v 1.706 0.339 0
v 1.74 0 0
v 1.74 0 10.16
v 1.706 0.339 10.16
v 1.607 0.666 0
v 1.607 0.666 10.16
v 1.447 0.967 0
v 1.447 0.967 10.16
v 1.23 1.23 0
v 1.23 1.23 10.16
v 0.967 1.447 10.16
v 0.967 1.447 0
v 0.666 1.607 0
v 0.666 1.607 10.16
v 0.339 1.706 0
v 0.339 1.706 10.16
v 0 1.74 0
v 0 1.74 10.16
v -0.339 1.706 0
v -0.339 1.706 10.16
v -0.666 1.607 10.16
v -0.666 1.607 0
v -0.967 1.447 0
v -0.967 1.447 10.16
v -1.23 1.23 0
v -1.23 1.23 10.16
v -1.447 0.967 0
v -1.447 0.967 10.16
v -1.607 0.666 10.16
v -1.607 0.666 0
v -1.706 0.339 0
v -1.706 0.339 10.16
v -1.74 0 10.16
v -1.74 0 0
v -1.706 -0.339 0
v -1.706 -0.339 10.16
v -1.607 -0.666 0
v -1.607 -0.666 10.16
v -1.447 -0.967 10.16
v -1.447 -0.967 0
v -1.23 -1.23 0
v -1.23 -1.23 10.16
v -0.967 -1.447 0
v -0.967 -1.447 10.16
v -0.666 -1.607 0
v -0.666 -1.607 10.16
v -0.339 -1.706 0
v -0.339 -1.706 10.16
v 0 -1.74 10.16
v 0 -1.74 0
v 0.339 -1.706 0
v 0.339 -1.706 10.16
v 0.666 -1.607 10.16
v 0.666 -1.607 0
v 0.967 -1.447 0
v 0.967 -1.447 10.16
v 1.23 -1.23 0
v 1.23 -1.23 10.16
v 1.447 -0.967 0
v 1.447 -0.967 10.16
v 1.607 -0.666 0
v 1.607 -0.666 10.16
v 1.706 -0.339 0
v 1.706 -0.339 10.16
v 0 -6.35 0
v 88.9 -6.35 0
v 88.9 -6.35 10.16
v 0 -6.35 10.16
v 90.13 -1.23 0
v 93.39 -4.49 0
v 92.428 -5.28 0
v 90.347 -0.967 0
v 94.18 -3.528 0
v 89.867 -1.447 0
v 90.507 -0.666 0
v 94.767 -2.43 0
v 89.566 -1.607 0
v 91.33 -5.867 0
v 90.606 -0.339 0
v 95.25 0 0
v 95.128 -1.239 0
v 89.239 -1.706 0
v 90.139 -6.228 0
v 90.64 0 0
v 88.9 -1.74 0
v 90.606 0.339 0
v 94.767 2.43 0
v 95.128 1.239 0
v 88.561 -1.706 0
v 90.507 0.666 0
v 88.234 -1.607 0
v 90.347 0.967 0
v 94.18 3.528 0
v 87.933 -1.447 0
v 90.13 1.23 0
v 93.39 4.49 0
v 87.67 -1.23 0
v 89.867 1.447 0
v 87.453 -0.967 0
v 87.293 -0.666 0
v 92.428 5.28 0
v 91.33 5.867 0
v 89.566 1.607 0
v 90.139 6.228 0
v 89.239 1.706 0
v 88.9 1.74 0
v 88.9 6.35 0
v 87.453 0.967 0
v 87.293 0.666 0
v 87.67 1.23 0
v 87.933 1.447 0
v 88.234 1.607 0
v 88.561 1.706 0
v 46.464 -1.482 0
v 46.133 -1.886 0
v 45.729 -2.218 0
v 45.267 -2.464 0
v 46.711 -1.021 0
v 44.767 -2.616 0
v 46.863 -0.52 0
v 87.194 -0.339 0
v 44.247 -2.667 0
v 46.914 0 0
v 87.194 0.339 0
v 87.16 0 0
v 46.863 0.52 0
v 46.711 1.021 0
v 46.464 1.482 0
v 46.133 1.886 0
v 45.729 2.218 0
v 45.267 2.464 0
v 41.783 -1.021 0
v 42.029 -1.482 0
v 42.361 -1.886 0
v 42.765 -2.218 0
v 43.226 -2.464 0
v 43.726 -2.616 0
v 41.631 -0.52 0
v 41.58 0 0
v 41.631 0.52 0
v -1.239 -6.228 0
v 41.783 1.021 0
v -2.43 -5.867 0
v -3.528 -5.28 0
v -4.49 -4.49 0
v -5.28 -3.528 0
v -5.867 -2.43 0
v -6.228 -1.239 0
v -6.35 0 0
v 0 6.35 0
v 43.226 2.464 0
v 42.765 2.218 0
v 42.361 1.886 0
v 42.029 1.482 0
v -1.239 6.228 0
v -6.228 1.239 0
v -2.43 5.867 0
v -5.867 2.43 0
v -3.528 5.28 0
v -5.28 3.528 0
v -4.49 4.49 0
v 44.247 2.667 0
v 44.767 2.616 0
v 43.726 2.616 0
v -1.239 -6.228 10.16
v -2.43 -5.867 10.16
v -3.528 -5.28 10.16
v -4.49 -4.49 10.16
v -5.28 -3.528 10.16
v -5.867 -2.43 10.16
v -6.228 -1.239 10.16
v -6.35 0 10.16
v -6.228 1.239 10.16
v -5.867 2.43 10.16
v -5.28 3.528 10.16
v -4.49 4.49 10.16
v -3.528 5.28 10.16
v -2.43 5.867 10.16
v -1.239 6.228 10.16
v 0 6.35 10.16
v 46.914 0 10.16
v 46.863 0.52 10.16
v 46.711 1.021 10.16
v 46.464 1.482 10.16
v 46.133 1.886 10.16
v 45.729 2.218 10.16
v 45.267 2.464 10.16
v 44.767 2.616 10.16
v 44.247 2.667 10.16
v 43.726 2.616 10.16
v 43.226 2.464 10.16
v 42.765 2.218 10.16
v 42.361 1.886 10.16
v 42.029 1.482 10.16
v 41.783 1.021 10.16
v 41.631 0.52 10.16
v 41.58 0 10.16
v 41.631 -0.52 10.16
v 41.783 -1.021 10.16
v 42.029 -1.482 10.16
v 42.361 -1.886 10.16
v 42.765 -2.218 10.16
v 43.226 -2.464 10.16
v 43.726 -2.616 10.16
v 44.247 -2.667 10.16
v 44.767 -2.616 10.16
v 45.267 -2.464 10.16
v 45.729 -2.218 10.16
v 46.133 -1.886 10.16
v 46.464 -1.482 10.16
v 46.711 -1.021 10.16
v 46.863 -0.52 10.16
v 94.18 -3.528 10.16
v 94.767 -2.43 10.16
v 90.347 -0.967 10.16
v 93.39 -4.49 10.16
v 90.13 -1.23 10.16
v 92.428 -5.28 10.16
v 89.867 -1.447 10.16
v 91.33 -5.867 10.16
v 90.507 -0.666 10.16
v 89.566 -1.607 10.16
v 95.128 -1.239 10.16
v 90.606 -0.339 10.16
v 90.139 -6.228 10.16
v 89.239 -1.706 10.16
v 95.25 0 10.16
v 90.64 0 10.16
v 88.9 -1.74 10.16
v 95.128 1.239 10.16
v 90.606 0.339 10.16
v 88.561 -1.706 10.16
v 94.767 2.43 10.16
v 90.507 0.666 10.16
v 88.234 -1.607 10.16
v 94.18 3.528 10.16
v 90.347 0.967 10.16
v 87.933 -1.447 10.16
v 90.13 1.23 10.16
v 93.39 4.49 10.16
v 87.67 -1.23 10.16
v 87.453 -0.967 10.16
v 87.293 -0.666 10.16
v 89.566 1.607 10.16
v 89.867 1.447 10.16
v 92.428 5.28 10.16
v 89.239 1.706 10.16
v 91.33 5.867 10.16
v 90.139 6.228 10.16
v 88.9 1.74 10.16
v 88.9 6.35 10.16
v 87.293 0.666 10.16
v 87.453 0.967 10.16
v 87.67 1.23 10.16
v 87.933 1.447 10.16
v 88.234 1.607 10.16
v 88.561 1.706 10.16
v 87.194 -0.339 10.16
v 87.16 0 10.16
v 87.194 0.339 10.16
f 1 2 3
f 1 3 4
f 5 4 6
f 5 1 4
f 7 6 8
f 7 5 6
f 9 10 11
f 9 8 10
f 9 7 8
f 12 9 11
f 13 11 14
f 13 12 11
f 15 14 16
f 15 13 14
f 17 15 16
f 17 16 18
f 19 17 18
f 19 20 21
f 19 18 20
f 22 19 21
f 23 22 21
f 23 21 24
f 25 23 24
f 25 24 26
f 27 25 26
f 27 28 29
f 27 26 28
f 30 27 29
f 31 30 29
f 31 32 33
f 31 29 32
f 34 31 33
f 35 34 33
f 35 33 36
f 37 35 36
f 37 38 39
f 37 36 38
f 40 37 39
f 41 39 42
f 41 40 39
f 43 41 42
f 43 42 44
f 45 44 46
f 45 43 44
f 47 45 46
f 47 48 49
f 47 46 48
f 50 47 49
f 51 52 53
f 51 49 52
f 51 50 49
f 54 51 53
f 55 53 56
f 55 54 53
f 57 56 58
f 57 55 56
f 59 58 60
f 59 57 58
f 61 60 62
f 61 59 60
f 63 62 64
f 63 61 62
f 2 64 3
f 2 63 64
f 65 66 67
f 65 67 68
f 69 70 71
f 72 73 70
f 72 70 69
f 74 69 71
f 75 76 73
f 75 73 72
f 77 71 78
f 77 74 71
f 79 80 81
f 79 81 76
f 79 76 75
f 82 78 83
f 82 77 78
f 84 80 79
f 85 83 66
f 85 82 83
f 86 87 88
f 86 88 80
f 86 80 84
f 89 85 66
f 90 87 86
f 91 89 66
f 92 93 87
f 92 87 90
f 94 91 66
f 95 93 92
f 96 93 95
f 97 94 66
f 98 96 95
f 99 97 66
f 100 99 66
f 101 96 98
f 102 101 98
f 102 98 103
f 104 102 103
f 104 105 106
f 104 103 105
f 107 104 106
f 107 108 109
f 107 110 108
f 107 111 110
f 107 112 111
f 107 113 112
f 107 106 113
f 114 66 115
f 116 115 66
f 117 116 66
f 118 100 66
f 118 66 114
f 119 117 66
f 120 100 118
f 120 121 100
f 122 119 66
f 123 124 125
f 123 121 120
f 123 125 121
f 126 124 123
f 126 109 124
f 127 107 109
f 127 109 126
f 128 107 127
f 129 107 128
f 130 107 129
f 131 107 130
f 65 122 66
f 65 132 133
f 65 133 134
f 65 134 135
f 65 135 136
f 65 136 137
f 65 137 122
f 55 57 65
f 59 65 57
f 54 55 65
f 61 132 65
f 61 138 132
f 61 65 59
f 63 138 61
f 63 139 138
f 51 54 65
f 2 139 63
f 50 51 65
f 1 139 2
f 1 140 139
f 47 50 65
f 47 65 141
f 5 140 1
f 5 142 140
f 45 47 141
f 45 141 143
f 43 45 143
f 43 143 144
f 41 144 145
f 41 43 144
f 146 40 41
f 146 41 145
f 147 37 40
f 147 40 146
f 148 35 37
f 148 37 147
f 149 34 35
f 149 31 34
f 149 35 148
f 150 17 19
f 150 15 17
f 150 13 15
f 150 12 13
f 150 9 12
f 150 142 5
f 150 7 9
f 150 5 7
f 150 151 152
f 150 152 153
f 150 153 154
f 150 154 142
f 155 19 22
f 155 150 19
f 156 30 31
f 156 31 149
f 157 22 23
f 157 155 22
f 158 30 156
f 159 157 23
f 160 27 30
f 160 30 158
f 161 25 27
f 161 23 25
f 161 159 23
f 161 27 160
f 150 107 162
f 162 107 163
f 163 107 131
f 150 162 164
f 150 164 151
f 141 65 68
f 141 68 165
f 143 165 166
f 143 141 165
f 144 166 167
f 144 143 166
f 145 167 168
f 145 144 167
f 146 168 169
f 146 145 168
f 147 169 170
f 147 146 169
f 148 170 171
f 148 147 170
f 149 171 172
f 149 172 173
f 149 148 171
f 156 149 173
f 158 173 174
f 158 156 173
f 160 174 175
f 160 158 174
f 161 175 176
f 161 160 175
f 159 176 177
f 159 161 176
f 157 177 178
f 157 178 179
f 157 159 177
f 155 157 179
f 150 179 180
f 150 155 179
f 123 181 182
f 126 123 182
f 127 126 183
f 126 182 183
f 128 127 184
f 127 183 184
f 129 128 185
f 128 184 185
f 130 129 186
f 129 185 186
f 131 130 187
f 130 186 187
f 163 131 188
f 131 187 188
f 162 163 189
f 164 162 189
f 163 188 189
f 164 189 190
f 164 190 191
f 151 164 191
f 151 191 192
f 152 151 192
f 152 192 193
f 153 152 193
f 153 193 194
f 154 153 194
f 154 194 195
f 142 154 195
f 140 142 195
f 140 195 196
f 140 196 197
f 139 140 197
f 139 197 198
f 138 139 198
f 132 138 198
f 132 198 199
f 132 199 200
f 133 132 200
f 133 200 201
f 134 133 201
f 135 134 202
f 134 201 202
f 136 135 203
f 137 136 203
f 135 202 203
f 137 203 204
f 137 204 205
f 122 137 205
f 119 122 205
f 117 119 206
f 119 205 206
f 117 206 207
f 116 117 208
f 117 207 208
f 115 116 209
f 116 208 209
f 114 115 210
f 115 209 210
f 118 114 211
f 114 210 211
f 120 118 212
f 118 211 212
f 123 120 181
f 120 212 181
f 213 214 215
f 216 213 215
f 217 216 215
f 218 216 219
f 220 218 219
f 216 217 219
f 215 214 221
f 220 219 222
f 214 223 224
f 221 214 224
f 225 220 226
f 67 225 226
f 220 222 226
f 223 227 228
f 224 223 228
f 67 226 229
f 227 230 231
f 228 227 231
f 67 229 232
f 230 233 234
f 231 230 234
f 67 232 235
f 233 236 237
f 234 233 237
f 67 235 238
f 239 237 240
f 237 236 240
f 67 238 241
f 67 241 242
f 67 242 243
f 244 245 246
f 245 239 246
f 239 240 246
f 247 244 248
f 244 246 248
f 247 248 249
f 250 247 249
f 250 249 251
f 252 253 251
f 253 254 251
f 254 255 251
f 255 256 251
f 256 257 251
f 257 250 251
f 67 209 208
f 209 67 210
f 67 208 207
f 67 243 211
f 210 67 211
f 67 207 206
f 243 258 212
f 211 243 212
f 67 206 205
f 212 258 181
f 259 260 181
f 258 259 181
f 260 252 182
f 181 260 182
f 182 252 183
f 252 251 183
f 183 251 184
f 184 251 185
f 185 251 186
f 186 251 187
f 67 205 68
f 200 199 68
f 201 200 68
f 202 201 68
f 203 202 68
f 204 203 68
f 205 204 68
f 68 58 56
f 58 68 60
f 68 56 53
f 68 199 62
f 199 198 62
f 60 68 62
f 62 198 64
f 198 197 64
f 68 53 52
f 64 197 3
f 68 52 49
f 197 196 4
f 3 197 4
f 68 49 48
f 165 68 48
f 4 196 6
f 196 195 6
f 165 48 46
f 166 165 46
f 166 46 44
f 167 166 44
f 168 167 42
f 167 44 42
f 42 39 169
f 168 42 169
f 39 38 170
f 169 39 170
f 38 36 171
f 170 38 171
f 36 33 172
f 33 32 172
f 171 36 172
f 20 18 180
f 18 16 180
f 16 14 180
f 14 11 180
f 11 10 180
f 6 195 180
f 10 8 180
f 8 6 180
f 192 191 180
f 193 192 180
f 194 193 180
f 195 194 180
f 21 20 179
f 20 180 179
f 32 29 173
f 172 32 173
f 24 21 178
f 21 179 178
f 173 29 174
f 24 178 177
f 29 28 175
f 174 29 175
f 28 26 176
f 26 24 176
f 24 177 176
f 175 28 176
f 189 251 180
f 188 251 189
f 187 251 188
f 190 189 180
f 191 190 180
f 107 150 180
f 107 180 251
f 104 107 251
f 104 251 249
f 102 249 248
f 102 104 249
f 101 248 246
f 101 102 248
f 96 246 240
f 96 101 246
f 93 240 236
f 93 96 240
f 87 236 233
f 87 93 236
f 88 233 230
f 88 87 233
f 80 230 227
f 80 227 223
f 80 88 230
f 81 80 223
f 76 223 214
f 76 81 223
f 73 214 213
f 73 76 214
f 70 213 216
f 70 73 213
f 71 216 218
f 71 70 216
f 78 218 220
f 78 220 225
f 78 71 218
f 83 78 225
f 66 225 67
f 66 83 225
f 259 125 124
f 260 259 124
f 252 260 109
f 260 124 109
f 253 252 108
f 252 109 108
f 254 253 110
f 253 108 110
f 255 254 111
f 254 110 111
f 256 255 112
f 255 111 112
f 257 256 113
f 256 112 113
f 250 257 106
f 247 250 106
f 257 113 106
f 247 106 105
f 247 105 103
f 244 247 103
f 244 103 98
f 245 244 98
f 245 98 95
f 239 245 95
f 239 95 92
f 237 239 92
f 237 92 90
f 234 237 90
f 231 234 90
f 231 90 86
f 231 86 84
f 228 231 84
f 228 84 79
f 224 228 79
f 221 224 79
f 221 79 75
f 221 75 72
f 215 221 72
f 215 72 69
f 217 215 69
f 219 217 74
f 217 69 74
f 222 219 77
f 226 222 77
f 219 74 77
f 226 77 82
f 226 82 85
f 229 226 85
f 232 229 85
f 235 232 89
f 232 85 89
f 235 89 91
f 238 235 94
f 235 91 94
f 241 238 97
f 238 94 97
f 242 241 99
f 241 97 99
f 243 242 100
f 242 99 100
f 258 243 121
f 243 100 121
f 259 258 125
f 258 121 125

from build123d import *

# Parameters (mm, degrees)
BOSS_EXTRUDE1_DEPTH     = 10.16
CUT_EXTRUDE1_START      = -11.16
SKETCH2_R               = 1.7399
CUT_EXTRUDE1_DEPTH      = 12.16
SKETCH3_R               = 2.667
CUT_EXTRUDE2_DEPTH      = 1
CUT_EXTRUDE2_DEPTH_BACK = 11.16


with BuildPart() as part:
    # Sketch1 → Boss-Extrude1 (new body)
    with BuildSketch(Plane.XY):
        with BuildLine():
            Line((0, 6.35), (88.9, 6.35))
            ThreePointArc((88.9, 6.35), (95.25, 0), (88.9, -6.35))
            Line((88.9, -6.35), (0, -6.35))
            ThreePointArc((0, -6.35), (-6.35, 0), (0, 6.35))
        make_face()
    extrude(amount=BOSS_EXTRUDE1_DEPTH)

    # Sketch2 → Cut-Extrude1 (cut)
    with BuildSketch(Plane.XY.offset(10.16).offset(CUT_EXTRUDE1_START)):
        Circle(SKETCH2_R)
    cut_extrude1 = extrude(amount=CUT_EXTRUDE1_DEPTH, mode=Mode.SUBTRACT)

    # Mirror1: Cut-Extrude1 across plane
    add(cut_extrude1.mirror(Plane(origin=(44.45, 0, 0), x_dir=(0, 0, 1), z_dir=(1, 0, 0))), mode=Mode.SUBTRACT)

    # Sketch3 → Cut-Extrude2 (cut, two sides)
    with BuildSketch(Plane.XY.offset(10.16)) as cut_extrude2_sk:
        with Locations((44.2468, 0)):
            Circle(SKETCH3_R)
    extrude(amount=CUT_EXTRUDE2_DEPTH, mode=Mode.SUBTRACT)
    extrude(cut_extrude2_sk.sketch, amount=-CUT_EXTRUDE2_DEPTH_BACK, mode=Mode.SUBTRACT)


solid = part.part
